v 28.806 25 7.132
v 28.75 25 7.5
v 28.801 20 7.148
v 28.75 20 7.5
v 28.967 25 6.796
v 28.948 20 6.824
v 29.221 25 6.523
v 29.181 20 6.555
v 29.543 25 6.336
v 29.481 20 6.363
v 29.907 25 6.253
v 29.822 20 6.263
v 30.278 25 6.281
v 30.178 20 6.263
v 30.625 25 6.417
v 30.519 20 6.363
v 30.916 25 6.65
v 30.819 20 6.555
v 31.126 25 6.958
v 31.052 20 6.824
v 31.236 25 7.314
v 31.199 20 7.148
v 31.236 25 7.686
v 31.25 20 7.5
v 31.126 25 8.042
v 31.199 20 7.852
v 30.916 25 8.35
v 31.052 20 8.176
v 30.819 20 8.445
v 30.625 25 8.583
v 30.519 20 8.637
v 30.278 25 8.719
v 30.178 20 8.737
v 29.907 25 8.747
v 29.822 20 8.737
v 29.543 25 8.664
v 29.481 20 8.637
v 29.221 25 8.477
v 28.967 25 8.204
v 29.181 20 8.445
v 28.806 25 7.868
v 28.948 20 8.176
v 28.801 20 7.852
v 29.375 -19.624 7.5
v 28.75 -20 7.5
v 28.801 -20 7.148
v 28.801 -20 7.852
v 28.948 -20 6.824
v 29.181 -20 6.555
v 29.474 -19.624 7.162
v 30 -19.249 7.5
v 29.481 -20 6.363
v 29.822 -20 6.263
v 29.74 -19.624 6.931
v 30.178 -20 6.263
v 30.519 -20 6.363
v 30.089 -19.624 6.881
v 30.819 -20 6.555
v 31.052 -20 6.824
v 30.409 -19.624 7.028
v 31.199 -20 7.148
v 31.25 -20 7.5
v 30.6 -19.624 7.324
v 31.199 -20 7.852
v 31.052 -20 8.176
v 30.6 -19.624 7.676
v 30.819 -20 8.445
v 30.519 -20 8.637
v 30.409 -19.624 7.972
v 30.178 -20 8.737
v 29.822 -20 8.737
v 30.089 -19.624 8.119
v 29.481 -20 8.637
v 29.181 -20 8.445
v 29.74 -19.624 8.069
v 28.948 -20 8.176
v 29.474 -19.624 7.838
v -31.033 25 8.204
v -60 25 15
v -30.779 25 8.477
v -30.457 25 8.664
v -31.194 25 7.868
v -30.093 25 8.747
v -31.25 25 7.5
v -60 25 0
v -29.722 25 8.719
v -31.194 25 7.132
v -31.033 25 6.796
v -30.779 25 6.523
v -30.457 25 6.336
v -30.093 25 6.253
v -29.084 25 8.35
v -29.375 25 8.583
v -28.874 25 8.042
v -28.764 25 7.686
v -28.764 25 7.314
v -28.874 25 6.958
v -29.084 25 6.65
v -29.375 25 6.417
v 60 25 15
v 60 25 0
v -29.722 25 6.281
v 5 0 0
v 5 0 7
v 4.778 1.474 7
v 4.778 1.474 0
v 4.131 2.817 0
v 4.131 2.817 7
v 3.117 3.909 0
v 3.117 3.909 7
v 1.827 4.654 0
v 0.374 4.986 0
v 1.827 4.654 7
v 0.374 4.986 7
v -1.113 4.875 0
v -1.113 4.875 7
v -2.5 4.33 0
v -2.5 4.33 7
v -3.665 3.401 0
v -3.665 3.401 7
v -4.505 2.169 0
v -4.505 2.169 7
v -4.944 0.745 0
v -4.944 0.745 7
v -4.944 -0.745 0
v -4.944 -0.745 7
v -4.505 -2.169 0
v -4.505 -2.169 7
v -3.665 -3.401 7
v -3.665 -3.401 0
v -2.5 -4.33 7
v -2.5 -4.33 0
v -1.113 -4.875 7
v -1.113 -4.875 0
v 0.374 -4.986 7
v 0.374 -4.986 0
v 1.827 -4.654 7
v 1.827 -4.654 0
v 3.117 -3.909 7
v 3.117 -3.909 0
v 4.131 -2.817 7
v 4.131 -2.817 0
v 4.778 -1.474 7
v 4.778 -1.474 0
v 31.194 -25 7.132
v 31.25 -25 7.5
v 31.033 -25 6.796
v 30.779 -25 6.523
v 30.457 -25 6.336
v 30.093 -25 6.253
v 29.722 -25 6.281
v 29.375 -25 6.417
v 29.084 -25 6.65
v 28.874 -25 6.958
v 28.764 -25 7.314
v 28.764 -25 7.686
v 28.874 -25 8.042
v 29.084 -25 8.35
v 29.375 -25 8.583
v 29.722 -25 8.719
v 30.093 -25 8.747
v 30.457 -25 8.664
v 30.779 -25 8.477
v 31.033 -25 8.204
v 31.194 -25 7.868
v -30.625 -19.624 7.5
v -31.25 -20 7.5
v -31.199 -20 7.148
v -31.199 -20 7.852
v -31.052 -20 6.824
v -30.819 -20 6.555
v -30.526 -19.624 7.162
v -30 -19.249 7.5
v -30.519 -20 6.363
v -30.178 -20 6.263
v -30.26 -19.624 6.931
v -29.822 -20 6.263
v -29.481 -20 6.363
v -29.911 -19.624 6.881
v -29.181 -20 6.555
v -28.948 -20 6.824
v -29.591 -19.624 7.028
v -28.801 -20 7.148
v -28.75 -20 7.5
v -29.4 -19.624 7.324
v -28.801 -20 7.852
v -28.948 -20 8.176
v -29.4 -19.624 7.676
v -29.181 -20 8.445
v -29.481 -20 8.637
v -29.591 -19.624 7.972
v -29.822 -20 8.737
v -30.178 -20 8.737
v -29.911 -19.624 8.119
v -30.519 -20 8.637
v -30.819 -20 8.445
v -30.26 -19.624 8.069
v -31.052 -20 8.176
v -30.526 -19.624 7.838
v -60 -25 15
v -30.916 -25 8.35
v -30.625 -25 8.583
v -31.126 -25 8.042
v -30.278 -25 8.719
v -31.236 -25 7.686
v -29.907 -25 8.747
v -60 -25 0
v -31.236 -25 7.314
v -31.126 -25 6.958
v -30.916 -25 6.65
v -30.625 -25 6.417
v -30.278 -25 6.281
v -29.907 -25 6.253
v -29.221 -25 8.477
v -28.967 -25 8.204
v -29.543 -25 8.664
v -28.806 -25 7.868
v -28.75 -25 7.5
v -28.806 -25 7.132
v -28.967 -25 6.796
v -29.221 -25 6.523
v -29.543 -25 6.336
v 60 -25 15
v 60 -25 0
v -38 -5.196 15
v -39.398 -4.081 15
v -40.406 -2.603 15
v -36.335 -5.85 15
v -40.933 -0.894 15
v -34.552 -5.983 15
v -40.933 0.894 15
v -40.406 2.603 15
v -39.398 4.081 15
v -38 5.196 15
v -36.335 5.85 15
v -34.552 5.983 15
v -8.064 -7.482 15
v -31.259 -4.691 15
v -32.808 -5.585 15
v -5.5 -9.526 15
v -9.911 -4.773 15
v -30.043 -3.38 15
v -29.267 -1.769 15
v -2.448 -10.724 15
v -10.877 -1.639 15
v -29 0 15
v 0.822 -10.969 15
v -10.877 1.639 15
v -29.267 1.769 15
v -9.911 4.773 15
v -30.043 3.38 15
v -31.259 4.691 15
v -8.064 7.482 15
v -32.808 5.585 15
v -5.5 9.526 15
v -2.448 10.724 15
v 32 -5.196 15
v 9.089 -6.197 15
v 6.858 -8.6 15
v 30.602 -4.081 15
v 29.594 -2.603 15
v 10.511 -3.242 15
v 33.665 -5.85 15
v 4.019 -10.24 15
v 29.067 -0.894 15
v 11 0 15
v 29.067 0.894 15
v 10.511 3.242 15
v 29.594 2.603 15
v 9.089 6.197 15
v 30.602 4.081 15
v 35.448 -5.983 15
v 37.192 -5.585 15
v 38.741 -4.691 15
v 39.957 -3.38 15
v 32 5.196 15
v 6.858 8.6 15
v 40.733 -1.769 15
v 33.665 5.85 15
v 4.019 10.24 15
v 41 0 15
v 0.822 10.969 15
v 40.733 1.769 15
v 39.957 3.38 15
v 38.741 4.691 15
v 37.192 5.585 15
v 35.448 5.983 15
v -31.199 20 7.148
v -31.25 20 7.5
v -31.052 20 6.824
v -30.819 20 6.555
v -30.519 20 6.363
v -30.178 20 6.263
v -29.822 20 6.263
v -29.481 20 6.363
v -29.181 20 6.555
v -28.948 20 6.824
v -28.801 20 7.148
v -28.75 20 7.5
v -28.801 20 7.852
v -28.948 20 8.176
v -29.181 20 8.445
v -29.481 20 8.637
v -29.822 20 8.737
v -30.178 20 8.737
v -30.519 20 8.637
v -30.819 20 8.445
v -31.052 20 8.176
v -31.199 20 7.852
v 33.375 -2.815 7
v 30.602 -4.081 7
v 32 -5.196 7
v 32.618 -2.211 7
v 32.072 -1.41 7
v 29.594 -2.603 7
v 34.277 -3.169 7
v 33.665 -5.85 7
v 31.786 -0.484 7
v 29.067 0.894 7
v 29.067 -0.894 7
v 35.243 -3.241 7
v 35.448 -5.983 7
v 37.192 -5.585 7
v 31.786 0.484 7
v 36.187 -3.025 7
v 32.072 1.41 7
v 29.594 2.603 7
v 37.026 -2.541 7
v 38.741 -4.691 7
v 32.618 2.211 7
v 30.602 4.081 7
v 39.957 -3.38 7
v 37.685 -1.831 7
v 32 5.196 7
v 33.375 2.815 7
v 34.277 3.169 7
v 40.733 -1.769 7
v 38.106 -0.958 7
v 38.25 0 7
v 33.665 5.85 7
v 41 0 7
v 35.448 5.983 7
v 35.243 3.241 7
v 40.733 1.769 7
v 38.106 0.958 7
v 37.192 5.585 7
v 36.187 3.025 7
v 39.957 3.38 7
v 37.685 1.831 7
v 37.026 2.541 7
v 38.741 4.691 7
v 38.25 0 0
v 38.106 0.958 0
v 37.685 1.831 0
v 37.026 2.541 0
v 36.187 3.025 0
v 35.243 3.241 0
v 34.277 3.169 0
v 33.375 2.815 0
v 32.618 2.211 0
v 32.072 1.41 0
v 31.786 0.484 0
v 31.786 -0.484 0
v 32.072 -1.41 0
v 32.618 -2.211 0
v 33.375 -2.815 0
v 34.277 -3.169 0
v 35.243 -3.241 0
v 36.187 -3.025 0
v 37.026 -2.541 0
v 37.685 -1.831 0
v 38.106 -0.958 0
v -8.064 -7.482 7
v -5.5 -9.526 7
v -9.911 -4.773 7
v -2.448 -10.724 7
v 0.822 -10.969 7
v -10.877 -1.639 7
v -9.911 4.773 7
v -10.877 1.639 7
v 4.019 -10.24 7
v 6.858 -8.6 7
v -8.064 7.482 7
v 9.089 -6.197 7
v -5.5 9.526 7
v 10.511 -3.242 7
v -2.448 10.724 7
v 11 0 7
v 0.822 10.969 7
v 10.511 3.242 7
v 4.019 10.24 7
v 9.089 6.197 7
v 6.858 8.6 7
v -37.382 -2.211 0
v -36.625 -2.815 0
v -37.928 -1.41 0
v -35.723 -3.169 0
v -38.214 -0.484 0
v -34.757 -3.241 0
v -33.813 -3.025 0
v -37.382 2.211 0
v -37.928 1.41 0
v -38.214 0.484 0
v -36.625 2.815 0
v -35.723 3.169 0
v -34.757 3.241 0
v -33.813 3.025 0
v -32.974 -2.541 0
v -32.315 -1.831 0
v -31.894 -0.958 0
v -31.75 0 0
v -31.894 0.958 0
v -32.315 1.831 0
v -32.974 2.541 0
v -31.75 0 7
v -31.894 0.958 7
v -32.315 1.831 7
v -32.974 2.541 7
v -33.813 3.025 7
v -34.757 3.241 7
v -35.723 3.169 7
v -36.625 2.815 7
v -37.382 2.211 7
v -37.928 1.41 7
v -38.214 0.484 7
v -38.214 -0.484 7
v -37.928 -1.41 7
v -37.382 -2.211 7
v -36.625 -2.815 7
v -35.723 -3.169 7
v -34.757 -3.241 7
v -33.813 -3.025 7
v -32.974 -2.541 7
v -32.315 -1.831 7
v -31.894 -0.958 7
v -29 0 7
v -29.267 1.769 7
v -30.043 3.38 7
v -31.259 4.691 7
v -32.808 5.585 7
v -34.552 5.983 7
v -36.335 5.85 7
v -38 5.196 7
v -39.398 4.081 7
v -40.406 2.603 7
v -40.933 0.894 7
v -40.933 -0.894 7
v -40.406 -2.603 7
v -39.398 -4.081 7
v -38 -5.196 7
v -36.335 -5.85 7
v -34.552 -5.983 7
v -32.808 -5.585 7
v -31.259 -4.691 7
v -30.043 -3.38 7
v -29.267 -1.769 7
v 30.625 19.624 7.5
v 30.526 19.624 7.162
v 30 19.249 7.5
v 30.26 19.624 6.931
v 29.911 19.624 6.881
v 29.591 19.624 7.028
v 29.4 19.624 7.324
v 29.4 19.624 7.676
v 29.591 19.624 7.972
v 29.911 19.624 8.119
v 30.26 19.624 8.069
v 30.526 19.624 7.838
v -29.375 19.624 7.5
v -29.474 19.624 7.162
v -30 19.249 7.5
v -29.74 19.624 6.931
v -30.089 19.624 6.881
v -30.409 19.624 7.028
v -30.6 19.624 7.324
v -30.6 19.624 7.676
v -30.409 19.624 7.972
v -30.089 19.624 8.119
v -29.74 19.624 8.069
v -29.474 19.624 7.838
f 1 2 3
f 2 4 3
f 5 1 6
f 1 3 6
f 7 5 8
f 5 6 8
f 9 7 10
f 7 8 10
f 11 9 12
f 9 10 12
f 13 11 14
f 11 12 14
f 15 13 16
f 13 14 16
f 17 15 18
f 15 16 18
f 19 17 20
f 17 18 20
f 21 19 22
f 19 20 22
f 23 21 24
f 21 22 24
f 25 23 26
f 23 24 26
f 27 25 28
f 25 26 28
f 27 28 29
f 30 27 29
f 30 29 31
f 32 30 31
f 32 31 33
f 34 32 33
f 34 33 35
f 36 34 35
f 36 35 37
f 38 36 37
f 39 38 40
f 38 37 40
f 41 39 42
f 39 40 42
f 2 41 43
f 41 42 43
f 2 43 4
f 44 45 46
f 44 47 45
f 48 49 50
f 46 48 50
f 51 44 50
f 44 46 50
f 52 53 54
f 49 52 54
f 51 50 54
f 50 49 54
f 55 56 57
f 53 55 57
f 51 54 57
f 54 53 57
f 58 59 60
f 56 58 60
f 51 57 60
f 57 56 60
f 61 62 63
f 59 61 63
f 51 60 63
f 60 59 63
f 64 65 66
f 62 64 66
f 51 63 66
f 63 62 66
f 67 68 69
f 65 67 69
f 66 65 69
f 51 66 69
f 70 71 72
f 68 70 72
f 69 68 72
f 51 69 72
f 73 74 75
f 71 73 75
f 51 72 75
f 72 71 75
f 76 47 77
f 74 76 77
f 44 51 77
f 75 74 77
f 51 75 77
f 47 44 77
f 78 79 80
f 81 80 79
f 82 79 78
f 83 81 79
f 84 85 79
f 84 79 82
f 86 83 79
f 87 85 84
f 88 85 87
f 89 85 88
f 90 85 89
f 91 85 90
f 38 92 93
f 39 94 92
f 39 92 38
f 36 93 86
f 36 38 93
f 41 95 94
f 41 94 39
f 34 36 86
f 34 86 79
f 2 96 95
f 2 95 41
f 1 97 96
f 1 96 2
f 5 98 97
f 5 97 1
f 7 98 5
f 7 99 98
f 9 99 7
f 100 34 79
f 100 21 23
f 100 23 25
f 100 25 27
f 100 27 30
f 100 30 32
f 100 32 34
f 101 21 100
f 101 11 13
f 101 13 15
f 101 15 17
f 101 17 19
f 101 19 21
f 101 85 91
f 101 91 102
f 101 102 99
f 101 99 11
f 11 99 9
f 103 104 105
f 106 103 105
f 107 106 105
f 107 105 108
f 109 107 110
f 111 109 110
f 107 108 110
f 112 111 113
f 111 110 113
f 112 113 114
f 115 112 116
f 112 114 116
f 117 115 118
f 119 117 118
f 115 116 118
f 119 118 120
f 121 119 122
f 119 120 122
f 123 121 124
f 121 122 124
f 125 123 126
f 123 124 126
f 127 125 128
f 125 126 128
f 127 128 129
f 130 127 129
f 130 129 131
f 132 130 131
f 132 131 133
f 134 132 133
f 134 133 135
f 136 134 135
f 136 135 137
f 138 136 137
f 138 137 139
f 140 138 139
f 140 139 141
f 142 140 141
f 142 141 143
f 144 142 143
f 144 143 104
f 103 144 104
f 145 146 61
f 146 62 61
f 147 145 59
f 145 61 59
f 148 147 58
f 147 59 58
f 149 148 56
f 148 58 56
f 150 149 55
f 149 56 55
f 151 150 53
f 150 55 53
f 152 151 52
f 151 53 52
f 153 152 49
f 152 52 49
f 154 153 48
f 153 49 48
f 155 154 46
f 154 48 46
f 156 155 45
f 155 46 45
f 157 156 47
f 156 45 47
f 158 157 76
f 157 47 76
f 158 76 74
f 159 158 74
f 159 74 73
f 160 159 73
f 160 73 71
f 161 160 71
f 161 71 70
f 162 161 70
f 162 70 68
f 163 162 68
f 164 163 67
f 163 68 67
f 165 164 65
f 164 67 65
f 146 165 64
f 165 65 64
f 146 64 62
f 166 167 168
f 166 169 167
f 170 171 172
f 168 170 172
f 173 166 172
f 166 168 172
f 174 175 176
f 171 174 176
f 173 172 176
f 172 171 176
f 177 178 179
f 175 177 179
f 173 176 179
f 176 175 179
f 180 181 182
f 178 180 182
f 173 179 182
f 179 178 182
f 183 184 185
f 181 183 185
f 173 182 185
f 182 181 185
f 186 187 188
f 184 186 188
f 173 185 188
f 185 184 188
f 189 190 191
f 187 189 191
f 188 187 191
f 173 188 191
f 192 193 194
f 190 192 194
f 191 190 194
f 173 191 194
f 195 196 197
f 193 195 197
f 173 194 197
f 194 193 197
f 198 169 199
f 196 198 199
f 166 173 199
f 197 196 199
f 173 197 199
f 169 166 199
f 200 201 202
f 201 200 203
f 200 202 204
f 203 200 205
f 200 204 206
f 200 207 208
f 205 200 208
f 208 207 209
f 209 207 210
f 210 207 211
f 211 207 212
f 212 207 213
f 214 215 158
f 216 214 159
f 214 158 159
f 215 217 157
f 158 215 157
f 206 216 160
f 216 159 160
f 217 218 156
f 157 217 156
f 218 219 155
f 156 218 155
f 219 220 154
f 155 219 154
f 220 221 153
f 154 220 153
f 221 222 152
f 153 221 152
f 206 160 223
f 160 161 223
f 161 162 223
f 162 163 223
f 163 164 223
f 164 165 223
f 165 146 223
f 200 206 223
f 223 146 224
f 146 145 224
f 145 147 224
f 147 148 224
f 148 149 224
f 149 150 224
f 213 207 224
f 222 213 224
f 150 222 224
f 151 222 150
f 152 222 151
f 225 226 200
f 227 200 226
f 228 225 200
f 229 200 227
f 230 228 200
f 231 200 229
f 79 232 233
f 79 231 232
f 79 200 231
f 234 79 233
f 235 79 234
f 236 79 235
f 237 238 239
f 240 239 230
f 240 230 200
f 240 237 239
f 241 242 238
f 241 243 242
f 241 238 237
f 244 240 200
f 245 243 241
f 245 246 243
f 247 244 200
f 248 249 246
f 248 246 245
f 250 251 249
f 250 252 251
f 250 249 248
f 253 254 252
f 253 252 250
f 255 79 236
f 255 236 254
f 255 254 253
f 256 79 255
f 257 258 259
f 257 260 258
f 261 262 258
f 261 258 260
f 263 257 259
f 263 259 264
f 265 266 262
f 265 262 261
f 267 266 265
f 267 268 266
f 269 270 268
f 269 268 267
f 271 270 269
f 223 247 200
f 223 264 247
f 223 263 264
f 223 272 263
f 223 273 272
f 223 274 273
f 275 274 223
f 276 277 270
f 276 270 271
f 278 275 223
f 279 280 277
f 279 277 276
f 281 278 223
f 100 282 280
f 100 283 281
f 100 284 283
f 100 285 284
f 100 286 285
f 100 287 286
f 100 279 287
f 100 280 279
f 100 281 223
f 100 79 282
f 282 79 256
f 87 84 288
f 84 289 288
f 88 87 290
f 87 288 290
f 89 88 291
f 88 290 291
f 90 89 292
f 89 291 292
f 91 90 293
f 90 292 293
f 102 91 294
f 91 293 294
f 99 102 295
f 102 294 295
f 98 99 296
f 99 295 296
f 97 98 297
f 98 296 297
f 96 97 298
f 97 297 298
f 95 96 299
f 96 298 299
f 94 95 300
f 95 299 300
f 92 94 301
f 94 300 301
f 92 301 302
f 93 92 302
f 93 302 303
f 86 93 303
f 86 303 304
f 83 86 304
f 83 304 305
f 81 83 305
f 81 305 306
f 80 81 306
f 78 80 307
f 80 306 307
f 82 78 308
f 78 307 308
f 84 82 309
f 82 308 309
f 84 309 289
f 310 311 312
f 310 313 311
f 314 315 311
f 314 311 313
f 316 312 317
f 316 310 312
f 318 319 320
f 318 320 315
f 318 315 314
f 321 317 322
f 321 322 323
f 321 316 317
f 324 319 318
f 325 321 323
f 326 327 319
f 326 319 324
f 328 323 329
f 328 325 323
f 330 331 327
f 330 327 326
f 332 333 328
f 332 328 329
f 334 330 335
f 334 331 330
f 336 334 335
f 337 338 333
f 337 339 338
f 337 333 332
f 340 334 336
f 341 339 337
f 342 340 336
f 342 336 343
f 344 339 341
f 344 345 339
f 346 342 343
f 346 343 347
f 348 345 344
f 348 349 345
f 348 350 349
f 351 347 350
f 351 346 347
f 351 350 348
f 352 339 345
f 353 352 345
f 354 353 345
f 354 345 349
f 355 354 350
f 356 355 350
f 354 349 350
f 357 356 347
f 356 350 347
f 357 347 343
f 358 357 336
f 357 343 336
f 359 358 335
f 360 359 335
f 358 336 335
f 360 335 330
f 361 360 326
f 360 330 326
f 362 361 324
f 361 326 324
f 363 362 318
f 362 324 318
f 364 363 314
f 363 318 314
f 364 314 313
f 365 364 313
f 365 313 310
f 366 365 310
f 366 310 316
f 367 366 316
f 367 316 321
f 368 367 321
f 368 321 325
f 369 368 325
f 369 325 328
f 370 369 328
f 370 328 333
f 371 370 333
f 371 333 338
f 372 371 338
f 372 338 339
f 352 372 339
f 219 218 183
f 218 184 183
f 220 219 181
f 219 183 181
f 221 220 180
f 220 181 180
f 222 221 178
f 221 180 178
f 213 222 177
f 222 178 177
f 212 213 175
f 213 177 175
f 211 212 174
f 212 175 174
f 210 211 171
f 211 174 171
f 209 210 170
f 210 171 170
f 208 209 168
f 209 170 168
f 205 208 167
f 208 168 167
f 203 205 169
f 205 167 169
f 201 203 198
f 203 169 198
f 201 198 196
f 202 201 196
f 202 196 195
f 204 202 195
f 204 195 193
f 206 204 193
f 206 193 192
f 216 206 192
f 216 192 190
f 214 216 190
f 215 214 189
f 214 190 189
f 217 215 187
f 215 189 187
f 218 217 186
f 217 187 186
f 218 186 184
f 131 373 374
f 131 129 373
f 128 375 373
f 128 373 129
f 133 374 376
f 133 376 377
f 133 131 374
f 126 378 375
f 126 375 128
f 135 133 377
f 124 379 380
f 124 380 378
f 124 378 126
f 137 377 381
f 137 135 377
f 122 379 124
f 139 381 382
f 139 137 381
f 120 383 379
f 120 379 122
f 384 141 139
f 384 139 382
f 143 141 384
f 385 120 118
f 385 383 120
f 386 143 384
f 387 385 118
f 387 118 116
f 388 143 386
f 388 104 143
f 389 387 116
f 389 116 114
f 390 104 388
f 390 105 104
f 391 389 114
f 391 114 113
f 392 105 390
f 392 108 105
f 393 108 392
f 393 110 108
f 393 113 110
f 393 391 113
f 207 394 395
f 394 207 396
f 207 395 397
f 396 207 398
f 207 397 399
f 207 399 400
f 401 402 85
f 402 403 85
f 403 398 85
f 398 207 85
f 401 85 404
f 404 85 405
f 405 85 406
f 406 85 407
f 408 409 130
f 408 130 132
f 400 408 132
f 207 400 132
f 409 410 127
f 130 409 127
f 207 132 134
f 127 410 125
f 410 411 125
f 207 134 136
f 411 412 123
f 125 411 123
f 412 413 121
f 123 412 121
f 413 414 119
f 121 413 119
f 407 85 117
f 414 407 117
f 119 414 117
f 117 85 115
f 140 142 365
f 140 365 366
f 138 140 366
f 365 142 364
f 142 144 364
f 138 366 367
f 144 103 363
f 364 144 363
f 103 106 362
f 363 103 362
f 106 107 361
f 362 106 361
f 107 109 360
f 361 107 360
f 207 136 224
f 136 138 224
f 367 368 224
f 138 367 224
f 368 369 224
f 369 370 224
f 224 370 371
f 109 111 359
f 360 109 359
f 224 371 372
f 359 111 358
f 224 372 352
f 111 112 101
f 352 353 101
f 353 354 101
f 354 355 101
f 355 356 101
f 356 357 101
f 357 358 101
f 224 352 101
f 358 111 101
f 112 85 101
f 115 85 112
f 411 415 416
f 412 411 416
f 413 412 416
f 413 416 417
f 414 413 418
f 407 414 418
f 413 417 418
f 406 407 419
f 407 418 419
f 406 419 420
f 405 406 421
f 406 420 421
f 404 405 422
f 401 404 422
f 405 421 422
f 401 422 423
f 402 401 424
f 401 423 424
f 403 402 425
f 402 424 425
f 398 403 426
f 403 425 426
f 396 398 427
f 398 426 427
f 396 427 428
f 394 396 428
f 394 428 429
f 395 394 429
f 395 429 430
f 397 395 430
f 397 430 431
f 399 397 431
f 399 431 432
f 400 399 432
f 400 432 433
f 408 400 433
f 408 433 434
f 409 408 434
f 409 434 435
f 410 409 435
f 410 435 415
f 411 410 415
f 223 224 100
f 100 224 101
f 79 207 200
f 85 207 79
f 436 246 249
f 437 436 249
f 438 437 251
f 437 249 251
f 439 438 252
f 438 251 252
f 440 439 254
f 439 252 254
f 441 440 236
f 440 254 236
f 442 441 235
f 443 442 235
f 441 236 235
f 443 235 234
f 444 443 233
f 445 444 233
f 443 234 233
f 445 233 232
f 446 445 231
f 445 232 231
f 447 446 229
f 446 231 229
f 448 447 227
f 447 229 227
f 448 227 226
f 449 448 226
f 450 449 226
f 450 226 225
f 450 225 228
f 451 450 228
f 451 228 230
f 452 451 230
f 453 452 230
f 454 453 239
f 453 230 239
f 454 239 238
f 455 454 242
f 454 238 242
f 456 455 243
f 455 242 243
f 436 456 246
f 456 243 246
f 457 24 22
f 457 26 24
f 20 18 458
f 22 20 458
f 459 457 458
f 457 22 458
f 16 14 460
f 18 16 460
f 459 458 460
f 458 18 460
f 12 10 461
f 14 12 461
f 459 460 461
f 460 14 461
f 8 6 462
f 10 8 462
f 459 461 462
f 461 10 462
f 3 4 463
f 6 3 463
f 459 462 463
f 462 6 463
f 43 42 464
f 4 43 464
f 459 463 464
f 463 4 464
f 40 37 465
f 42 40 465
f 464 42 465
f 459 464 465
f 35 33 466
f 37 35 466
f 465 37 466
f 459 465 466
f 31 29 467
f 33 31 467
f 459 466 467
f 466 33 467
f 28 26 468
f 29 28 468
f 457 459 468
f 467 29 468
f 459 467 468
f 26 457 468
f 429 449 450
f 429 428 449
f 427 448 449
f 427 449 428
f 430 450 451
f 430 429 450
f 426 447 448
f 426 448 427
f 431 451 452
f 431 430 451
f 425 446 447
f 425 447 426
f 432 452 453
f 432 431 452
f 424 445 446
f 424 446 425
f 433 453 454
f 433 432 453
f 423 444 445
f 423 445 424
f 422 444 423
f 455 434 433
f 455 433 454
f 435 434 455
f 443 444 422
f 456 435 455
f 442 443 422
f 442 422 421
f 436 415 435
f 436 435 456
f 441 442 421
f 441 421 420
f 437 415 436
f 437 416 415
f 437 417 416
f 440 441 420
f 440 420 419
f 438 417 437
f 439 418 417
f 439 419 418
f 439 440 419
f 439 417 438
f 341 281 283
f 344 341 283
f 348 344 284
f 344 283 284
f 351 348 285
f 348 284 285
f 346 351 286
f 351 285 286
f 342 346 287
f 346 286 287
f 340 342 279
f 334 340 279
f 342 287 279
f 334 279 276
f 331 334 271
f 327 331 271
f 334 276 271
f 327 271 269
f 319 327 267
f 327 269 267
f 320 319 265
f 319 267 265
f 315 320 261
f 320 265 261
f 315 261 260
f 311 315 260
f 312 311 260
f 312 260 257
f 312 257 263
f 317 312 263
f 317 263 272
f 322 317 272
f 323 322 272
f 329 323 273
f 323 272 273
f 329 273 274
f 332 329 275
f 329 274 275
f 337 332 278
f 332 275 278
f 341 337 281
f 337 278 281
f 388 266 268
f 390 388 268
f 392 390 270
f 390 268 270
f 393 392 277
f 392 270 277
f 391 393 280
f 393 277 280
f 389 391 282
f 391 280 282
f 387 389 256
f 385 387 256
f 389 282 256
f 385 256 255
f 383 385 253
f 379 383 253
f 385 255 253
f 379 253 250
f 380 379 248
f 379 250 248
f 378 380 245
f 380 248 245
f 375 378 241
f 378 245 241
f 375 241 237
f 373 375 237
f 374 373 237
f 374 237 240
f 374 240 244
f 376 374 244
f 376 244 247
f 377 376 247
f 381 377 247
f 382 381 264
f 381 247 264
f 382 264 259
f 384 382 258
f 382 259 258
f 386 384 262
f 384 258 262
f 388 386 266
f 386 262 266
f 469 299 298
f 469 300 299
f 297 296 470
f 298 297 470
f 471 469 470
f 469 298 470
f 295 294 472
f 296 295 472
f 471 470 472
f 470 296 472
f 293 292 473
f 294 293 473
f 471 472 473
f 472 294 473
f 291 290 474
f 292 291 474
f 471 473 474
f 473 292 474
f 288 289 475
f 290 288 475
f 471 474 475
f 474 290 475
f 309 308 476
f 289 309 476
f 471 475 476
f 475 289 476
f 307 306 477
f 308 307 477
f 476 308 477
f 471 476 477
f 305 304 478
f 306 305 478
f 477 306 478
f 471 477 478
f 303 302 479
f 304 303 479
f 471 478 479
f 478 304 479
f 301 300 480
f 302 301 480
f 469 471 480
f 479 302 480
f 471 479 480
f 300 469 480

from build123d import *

# Parameters (mm, degrees)
SKETCH_1_W             = 120
SKETCH_1_H             = 50
EXTRUDE_1_DEPTH        = 15
SKETCH_2_R             = 6
CUT_EXTRUDE_1_DEPTH    = 8
SKETCH_3_R             = 11
CUT_EXTRUDE_2_DEPTH    = 8
SKETCH_10_R            = 3.25
CUT_EXTRUDE_4_DEPTH    = 10
SKETCH_11_R            = 5
CUT_EXTRUDE_5_DEPTH    = 10
HOLE_WIZARD_M3_1_D     = 2.5
HOLE_WIZARD_M3_1_DEPTH = 5
HOLE_WIZARD_M3_1_TIP   = 0.751075774
HOLE_WIZARD_M3_2_D     = 2.5
HOLE_WIZARD_M3_2_DEPTH = 5
HOLE_WIZARD_M3_2_TIP   = 0.751075774


with BuildPart() as part:
    # 草图1 → 凸台-拉伸1 (new body)
    with BuildSketch(Plane.XY):
        Rectangle(SKETCH_1_W, SKETCH_1_H)
    extrude(amount=EXTRUDE_1_DEPTH)

    # 草图2 → 切除-拉伸1 (cut)
    with BuildSketch(Plane.XY.offset(15)):
        with Locations((-35, 0)):
            Circle(SKETCH_2_R)
        with Locations((35, 0)):
            Circle(SKETCH_2_R)
    extrude(amount=-CUT_EXTRUDE_1_DEPTH, mode=Mode.SUBTRACT)

    # 草图3 → 切除-拉伸2 (cut)
    with BuildSketch(Plane.XY.offset(15)):
        Circle(SKETCH_3_R)
    extrude(amount=-CUT_EXTRUDE_2_DEPTH, mode=Mode.SUBTRACT)

    # 草图10 → 切除-拉伸4 (cut)
    with BuildSketch(Plane.XY.offset(7)):
        with Locations((-35, 0)):
            Circle(SKETCH_10_R)
        with Locations((35, 0)):
            Circle(SKETCH_10_R)
    extrude(amount=-CUT_EXTRUDE_4_DEPTH, mode=Mode.SUBTRACT)

    # 草图11 → 切除-拉伸5 (cut)
    with BuildSketch(Plane.XY.offset(7)):
        Circle(SKETCH_11_R)
    extrude(amount=-CUT_EXTRUDE_5_DEPTH, mode=Mode.SUBTRACT)

    # M3 螺纹孔1
    with Locations(Plane(origin=(0, 25, 0), x_dir=(1, 0, 0), z_dir=(0, 1, 0))):
        with Locations((30, -7.5), (-30, -7.5)):
            Hole(HOLE_WIZARD_M3_1_D / 2, depth=HOLE_WIZARD_M3_1_DEPTH)
            with Locations((0, 0, -(HOLE_WIZARD_M3_1_DEPTH + HOLE_WIZARD_M3_1_TIP / 2))):  # 118° drill point
                Cone(0, HOLE_WIZARD_M3_1_D / 2, HOLE_WIZARD_M3_1_TIP, mode=Mode.SUBTRACT)

    # M3 螺纹孔2
    with Locations(Plane(origin=(0, -25, 0), x_dir=(-1, 0, 0), z_dir=(0, -1, 0))):
        with Locations((-30, -7.5), (30, -7.5)):
            Hole(HOLE_WIZARD_M3_2_D / 2, depth=HOLE_WIZARD_M3_2_DEPTH)
            with Locations((0, 0, -(HOLE_WIZARD_M3_2_DEPTH + HOLE_WIZARD_M3_2_TIP / 2))):  # 118° drill point
                Cone(0, HOLE_WIZARD_M3_2_D / 2, HOLE_WIZARD_M3_2_TIP, mode=Mode.SUBTRACT)


solid = part.part
